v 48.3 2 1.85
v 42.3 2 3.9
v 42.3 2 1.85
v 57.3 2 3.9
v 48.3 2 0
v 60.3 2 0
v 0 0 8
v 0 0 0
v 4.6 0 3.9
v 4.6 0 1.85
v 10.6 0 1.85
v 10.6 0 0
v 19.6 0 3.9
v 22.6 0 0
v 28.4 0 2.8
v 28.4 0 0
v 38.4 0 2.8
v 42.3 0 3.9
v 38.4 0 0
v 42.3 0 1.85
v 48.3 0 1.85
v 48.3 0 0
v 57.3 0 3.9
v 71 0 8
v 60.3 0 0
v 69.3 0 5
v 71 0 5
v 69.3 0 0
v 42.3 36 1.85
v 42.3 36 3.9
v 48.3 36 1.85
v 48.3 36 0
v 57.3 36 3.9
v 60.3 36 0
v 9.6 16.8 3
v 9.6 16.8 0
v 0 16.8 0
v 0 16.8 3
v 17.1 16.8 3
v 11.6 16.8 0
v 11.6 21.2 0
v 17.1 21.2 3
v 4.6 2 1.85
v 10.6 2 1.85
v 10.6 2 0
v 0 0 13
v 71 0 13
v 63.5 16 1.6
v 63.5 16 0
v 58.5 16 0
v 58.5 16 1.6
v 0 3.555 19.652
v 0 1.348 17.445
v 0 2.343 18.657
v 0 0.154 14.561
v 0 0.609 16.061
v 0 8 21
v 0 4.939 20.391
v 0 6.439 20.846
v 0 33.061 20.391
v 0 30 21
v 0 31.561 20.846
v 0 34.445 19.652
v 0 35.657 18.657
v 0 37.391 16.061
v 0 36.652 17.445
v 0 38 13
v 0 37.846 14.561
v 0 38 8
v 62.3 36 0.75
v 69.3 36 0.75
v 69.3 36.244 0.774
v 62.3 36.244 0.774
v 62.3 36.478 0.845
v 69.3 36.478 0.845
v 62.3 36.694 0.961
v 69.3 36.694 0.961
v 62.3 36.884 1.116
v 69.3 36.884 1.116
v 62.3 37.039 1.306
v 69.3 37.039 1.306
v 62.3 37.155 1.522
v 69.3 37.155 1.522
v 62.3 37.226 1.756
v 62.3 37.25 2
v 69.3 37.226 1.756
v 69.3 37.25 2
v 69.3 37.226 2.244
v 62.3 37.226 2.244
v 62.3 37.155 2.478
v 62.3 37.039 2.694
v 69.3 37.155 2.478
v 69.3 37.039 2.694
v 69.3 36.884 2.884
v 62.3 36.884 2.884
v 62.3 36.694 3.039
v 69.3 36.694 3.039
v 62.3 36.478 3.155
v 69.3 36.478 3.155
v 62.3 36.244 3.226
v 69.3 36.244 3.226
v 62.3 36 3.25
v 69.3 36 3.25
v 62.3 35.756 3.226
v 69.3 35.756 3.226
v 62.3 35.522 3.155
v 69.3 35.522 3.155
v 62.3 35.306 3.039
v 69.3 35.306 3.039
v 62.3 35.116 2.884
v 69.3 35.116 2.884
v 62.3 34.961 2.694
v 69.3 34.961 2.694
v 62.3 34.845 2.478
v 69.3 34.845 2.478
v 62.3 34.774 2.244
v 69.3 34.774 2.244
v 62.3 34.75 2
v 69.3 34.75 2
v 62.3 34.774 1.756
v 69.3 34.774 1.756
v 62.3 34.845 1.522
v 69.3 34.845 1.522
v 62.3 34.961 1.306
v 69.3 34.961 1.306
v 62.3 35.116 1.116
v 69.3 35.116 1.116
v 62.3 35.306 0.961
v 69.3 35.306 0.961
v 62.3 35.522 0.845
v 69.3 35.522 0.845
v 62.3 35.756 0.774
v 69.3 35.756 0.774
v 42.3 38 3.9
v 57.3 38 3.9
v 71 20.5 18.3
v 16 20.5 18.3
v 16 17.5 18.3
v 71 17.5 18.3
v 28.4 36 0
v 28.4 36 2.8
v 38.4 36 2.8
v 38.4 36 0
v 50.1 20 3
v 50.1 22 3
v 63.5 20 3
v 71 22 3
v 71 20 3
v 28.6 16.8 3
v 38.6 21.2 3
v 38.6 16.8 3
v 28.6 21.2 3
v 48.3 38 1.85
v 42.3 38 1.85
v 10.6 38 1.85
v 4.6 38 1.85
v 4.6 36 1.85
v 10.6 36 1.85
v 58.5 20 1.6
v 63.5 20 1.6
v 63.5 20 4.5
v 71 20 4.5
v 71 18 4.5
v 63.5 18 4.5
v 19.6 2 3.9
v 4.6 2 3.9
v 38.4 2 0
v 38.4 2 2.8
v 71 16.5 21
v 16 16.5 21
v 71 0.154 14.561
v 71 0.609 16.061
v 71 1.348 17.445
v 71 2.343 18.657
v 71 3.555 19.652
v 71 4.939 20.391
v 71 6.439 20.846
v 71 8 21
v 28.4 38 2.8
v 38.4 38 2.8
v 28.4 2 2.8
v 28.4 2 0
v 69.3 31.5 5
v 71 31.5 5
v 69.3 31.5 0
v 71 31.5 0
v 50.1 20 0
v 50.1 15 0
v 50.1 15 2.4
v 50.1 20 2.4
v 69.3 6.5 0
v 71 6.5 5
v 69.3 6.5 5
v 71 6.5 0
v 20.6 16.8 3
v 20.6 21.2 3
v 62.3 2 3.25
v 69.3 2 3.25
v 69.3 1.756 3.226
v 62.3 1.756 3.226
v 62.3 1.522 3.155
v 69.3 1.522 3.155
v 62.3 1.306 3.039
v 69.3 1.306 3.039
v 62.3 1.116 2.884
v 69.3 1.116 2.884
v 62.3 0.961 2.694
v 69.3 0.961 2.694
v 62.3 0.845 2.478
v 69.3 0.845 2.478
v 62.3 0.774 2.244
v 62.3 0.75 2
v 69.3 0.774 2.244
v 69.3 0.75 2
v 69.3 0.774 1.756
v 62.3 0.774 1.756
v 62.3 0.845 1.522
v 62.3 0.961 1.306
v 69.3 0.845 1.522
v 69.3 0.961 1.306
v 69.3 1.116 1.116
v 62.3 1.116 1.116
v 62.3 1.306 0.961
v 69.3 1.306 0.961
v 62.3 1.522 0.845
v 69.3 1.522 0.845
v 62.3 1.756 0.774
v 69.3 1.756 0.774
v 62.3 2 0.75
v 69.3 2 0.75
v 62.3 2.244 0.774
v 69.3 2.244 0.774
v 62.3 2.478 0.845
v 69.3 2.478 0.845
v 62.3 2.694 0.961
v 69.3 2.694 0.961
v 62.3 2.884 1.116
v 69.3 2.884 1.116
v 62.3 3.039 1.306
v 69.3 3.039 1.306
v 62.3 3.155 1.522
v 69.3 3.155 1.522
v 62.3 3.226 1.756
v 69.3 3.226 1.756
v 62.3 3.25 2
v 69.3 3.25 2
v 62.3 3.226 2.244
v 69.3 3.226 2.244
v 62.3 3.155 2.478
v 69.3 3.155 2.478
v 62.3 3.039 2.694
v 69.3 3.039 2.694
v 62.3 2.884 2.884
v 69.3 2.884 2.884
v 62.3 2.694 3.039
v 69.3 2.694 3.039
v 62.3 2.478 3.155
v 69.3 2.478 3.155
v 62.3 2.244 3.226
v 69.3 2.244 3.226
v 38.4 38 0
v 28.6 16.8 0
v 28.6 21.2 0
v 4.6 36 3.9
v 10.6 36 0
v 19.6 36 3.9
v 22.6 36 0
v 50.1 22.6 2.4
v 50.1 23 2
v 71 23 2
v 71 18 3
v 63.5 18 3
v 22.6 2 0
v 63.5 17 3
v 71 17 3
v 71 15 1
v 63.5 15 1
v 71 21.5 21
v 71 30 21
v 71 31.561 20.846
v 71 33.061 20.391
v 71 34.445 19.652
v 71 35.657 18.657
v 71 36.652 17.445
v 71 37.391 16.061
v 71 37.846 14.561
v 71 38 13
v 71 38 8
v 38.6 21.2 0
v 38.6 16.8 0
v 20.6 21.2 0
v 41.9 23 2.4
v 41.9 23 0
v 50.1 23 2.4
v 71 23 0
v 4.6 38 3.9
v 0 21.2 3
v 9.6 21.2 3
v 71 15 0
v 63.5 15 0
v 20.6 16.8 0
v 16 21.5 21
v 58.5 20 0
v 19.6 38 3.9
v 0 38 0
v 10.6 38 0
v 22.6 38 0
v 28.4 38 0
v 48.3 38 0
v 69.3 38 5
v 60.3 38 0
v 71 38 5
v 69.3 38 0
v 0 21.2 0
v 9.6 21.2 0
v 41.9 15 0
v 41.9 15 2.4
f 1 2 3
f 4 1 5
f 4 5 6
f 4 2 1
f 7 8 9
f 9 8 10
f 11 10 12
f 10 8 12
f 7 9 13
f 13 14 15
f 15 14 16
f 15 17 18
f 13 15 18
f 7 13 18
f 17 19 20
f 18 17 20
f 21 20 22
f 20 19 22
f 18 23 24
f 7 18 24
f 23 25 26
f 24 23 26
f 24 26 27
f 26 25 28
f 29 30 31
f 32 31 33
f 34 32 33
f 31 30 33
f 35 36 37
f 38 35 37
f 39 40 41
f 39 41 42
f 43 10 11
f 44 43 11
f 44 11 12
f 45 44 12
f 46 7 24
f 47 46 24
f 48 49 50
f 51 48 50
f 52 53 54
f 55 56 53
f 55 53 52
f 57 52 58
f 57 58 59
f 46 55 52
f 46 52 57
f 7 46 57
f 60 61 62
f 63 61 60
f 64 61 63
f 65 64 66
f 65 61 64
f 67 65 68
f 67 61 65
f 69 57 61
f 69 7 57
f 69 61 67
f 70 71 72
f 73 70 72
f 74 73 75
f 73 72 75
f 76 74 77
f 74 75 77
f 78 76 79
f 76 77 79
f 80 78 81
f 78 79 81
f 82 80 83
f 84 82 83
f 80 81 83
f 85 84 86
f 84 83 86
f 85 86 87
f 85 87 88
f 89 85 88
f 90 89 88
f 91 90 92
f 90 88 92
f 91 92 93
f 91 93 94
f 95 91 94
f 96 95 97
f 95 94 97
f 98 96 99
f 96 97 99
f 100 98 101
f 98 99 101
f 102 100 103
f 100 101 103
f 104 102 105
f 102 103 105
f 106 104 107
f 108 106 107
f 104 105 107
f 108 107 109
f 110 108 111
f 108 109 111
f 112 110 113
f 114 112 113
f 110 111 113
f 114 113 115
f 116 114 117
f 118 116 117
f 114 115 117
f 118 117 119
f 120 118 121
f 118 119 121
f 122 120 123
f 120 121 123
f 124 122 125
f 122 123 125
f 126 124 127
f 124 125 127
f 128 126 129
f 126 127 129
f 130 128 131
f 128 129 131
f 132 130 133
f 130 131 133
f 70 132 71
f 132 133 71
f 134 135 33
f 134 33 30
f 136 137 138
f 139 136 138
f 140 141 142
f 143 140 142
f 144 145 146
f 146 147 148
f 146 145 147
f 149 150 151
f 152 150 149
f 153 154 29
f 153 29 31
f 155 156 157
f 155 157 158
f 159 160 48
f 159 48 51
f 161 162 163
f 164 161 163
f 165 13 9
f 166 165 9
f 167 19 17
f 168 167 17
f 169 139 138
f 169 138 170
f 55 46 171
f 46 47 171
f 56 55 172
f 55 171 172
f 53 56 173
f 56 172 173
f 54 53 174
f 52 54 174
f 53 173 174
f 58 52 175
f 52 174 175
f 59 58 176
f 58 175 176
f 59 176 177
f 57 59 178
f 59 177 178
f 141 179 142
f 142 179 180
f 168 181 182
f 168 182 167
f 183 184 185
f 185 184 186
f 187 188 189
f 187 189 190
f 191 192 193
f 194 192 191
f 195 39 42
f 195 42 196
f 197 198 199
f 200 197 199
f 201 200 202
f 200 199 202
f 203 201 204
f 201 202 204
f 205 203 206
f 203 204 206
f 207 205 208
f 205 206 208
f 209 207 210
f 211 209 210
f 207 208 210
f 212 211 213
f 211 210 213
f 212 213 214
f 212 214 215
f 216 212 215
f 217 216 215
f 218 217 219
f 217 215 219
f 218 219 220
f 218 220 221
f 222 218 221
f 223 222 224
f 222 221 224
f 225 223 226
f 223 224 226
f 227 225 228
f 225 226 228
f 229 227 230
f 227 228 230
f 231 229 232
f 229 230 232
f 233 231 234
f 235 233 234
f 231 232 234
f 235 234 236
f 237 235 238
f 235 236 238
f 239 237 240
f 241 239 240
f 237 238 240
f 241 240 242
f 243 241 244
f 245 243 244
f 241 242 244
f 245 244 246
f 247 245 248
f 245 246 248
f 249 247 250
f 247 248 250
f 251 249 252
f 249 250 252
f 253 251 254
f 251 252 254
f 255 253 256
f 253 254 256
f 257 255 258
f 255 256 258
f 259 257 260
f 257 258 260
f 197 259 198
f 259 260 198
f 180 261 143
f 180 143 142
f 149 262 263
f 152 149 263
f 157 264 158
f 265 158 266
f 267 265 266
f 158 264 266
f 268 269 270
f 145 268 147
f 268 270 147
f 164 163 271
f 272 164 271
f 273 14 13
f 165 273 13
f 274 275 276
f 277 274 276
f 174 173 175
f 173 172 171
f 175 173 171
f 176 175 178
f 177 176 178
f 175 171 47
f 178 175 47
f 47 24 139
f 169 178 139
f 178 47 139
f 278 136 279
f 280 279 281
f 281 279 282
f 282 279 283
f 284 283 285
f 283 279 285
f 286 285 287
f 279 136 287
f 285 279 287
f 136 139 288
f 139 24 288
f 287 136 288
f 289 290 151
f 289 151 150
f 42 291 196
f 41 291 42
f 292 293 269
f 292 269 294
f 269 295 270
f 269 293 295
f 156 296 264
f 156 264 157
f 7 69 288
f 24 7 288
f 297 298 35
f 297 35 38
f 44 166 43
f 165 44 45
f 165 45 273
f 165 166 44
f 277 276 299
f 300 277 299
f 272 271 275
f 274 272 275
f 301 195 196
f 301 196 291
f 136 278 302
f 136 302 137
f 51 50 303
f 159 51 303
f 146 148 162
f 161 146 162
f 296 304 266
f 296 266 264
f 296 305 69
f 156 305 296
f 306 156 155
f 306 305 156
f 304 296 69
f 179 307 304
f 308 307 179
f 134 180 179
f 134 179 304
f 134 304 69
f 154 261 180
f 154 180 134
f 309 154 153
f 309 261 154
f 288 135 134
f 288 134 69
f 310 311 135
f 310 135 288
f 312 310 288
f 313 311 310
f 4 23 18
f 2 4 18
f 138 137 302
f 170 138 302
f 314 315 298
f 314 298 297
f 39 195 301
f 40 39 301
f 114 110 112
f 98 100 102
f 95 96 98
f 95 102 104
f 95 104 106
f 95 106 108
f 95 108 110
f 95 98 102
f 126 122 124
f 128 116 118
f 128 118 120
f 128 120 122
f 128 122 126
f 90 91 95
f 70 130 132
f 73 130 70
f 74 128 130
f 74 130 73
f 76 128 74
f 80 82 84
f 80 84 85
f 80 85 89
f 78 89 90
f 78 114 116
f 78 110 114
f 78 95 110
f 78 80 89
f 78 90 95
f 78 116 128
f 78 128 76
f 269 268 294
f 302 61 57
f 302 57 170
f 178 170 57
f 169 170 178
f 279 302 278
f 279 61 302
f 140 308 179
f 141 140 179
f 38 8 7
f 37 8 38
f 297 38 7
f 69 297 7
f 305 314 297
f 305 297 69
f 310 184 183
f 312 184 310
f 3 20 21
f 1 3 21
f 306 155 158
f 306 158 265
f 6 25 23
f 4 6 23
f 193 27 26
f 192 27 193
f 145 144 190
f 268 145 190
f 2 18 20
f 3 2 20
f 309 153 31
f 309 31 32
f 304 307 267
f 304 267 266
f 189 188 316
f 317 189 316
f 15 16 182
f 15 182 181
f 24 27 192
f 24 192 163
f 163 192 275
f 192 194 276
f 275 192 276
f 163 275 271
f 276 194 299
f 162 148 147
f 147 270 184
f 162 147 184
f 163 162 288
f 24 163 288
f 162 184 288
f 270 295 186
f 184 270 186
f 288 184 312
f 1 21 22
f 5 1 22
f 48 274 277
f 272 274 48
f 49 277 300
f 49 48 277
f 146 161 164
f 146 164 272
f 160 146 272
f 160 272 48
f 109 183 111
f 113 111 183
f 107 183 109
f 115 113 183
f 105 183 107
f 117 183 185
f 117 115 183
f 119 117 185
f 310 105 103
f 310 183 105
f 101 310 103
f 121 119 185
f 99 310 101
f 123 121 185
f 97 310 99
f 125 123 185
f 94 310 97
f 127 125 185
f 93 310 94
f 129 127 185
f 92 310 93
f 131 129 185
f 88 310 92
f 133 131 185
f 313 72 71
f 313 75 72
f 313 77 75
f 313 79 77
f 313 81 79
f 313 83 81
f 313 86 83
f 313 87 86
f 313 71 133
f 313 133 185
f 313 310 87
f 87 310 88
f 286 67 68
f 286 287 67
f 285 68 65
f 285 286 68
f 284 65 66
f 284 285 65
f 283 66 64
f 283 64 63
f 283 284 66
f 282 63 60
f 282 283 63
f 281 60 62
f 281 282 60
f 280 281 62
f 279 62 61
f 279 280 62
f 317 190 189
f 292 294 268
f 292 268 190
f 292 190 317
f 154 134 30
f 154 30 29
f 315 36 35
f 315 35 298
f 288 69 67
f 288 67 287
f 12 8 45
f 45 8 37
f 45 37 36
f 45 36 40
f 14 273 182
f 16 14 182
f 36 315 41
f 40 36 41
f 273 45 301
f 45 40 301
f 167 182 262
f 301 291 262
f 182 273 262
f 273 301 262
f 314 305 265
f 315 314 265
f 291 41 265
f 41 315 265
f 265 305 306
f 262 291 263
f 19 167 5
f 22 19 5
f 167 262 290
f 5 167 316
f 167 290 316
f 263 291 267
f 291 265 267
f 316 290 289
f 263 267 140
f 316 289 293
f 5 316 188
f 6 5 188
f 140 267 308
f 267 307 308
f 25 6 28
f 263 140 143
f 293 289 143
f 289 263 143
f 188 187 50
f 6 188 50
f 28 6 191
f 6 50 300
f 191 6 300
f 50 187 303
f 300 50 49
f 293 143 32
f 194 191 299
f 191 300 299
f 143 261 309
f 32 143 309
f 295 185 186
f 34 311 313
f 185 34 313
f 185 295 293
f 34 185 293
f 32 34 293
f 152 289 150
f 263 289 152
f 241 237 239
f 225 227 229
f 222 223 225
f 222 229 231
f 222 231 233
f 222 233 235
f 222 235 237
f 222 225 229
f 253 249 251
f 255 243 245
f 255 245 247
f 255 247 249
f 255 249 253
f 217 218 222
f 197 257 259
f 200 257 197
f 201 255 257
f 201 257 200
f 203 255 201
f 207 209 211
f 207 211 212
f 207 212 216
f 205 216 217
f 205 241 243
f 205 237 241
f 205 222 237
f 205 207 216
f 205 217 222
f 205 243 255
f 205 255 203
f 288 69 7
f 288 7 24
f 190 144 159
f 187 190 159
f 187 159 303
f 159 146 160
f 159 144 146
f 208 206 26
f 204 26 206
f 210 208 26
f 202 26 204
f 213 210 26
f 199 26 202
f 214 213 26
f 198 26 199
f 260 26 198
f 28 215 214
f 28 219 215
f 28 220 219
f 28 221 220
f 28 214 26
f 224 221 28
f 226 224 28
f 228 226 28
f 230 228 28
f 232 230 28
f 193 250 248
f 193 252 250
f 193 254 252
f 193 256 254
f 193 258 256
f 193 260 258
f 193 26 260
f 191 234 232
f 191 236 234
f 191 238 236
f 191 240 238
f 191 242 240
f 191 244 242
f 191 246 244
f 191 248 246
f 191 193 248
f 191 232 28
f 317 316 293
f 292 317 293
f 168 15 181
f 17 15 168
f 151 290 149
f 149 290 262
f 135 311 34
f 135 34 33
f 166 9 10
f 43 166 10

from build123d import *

# Parameters (mm, degrees)
SKETCH_1_W                      = 71
SKETCH_1_H                      = 38
EXTRUDE_1_DEPTH                 = 8
SKETCH_2_W                      = 5
SKETCH_2_H                      = 6.5
CUT_EXTRUDE_1_DEPTH             = 1.7
SKETCH_3_W                      = 10
SKETCH_3_H                      = 2.8
CUT_EXTRUDE_2_DEPTH             = 2
SKETCH_4_W                      = 9.6
SKETCH_4_H                      = 4.4
SKETCH_4_W_2                    = 10
CUT_EXTRUDE_3_DEPTH             = 3
SKETCH_5_W                      = 8.2
SKETCH_5_H                      = 8
CUT_EXTRUDE_4_DEPTH             = 2.4
CUT_EXTRUDE_5_DEPTH             = 7.5
CUT_EXTRUDE_6_DEPTH             = 13.4
SKETCH_9_W                      = 5
SKETCH_9_H                      = 4
CUT_EXTRUDE_7_DEPTH             = 1.6
CUT_EXTRUDE_8_REACH             = 75.932
CUT_EXTRUDE_8_DIRECTION_2_REACH = 75.932
SKETCH_12_R                     = 1.25
CUT_EXTRUDE_9_DEPTH             = 7
SKETCH_13_W                     = 71
SKETCH_13_H                     = 38
EXTRUDE_2_DEPTH                 = 13
FILLET_1_R                      = 8
CUT_EXTRUDE_10_DEPTH            = 55


with BuildPart() as part:
    # Эскиз1 → Бобышка-Вытянуть1 (new body)
    with BuildSketch(Plane.XY):
        with Locations((35.5, 19)):
            Rectangle(SKETCH_1_W, SKETCH_1_H)
    extrude(amount=EXTRUDE_1_DEPTH)

    # Эскиз2 → Вырез-Вытянуть1 (cut)
    with BuildSketch(Plane(origin=(71, 0, 0), x_dir=(0, 0, -1), z_dir=(1, 0, 0))):
        with Locations((-2.5, 3.25)):
            Rectangle(SKETCH_2_W, SKETCH_2_H)
        with Locations((-2.5, 34.75)):
            Rectangle(SKETCH_2_W, SKETCH_2_H)
    extrude(amount=-CUT_EXTRUDE_1_DEPTH, mode=Mode.SUBTRACT)

    # Эскиз3 → Вырез-Вытянуть2 (cut)
    with BuildSketch(Plane.XZ):
        Polygon((60.3, 0), (57.3, 3.9), (42.3, 3.9), (42.3, 1.85), (48.3, 1.85), (48.3, 0), align=None)
        with Locations((33.4, 1.4)):
            Rectangle(SKETCH_3_W, SKETCH_3_H)
        Polygon((22.6, 0), (19.6, 3.9), (4.6, 3.9), (4.6, 1.85), (10.6, 1.85), (10.6, 0), align=None)
    cut_extrude_2 = extrude(amount=-CUT_EXTRUDE_2_DEPTH, mode=Mode.SUBTRACT)

    # Зеркальное отражение1: Вырез-Вытянуть2 across plane
    add(cut_extrude_2.mirror(Plane(origin=(0, 19, 0), x_dir=(0, 0, 1), z_dir=(0, -1, 0))), mode=Mode.SUBTRACT)

    # Эскиз4 → Вырез-Вытянуть3 (cut)
    with BuildSketch(Plane(origin=(0, 0, 0), x_dir=(-1, 0, 0), z_dir=(0, 0, -1))):
        with Locations((-4.8, 19)):
            Rectangle(SKETCH_4_W, SKETCH_4_H)
        with Locations((-33.6, 19)):
            Rectangle(SKETCH_4_W_2, SKETCH_4_H)
    extrude(amount=-CUT_EXTRUDE_3_DEPTH, mode=Mode.SUBTRACT)

    # Эскиз5 → Вырез-Вытянуть4 (cut)
    with BuildSketch(Plane(origin=(0, 0, 0), x_dir=(-1, 0, 0), z_dir=(0, 0, -1))):
        with Locations((-46, 19)):
            Rectangle(SKETCH_5_W, SKETCH_5_H)
    extrude(amount=-CUT_EXTRUDE_4_DEPTH, mode=Mode.SUBTRACT)

    # Эскиз7 → Вырез-Вытянуть5 (cut)
    with BuildSketch(Plane(origin=(71, 0, 0), x_dir=(0, 0, -1), z_dir=(1, 0, 0))):
        Polygon((-3, 18), (-3, 17), (-1, 15), (0, 15), (0, 23), (-2, 23), (-3, 22), (-3, 20), (-4.5, 20), (-4.5, 18), align=None)
    extrude(amount=-CUT_EXTRUDE_5_DEPTH, mode=Mode.SUBTRACT)

    # Эскиз8 → Вырез-Вытянуть6 (cut)
    with BuildSketch(Plane(origin=(63.5, 0, 0), x_dir=(0, 0, -1), z_dir=(1, 0, 0))):
        Polygon((0, 23), (-2, 23), (-3, 22), (-3, 20), (0, 20), align=None)
    extrude(amount=-CUT_EXTRUDE_6_DEPTH, mode=Mode.SUBTRACT)

    # Эскиз9 → Вырез-Вытянуть7 (cut)
    with BuildSketch(Plane(origin=(0, 0, 0), x_dir=(-1, 0, 0), z_dir=(0, 0, -1))):
        with Locations((-61, 18)):
            Rectangle(SKETCH_9_W, SKETCH_9_H)
    extrude(amount=-CUT_EXTRUDE_7_DEPTH, mode=Mode.SUBTRACT)

    # Вырез-Вытянуть8: up to this face of the body (flat: up to its plane)
    cut_extrude_8_end = Plane(part.part.faces().sort_by_distance((33.6, 21.2, 1.5))[0])
    # Эскиз11 → Вырез-Вытянуть8 (cut, up to the picked face)
    with BuildSketch(Plane(origin=(0, 19, 0), x_dir=(-1, 0, 0), z_dir=(0, -1, 0)), mode=Mode.PRIVATE) as cut_extrude_8_sk1:
        Polygon((-20.6, 0), (-11.6, 0), (-17.1, -3), (-20.6, -3), align=None)
    cut_extrude_8_tool1 = split(extrude(cut_extrude_8_sk1.sketch, amount=-CUT_EXTRUDE_8_REACH, mode=Mode.PRIVATE), bisect_by=cut_extrude_8_end, keep=Keep.BOTH, mode=Mode.PRIVATE)
    add(cut_extrude_8_tool1.solids().sort_by(Axis((17.273333, 19, 1.28), (0, 1, 0)))[0], mode=Mode.SUBTRACT)

    # Вырез-Вытянуть8 direction 2: up to this face of the body (flat: up to its plane)
    cut_extrude_8_direction_2_end = Plane(part.part.faces().sort_by_distance((33.6, 16.8, 1.5))[0])
    # Эскиз11 → Вырез-Вытянуть8 direction 2 (cut, up to the picked face)
    with BuildSketch(Plane(origin=(0, 19, 0), x_dir=(-1, 0, 0), z_dir=(0, -1, 0)), mode=Mode.PRIVATE) as cut_extrude_8_direction_2_sk1:
        Polygon((-20.6, 0), (-11.6, 0), (-17.1, -3), (-20.6, -3), align=None)
    cut_extrude_8_direction_2_tool1 = split(extrude(cut_extrude_8_direction_2_sk1.sketch, amount=CUT_EXTRUDE_8_DIRECTION_2_REACH, mode=Mode.PRIVATE), bisect_by=cut_extrude_8_direction_2_end, keep=Keep.BOTH, mode=Mode.PRIVATE)
    add(cut_extrude_8_direction_2_tool1.solids().sort_by(Axis((17.273333, 19, 1.28), (0, -1, 0)))[0], mode=Mode.SUBTRACT)

    # Эскиз12 → Вырез-Вытянуть9 (cut)
    with BuildSketch(Plane(origin=(69.3, 0, 0), x_dir=(0, 0, -1), z_dir=(1, 0, 0))):
        with Locations((-2, 36)):
            Circle(SKETCH_12_R)
        with Locations(Location((-2, 2, 0), (0, 0, 180))):
            Circle(SKETCH_12_R)
    extrude(amount=-CUT_EXTRUDE_9_DEPTH, mode=Mode.SUBTRACT)


with BuildPart() as body_2:
    # Эскиз13 → Бобышка-Вытянуть2 (new body)
    with BuildSketch(Plane.XY.offset(8)):
        with Locations((35.5, 19)):
            Rectangle(SKETCH_13_W, SKETCH_13_H)
    extrude(amount=EXTRUDE_2_DEPTH)

    # Скругление1
    fillet_1_edges = [body_2.edges().sort_by_distance(p)[0] for p in [
        (35.5, 0, 21),
        (35.5, 38, 21),
    ]]
    fillet(fillet_1_edges, radius=FILLET_1_R)

    # Эскиз14 → Вырез-Вытянуть10 (cut)
    with BuildSketch(Plane(origin=(71, 0, 0), x_dir=(0, 0, -1), z_dir=(1, 0, 0))):
        Polygon((-21, 16.5), (-21, 21.5), (-18.3, 20.5), (-18.3, 17.5), align=None)
    extrude(amount=-CUT_EXTRUDE_10_DEPTH, mode=Mode.SUBTRACT)


solid = Compound([part.part, body_2.part])
